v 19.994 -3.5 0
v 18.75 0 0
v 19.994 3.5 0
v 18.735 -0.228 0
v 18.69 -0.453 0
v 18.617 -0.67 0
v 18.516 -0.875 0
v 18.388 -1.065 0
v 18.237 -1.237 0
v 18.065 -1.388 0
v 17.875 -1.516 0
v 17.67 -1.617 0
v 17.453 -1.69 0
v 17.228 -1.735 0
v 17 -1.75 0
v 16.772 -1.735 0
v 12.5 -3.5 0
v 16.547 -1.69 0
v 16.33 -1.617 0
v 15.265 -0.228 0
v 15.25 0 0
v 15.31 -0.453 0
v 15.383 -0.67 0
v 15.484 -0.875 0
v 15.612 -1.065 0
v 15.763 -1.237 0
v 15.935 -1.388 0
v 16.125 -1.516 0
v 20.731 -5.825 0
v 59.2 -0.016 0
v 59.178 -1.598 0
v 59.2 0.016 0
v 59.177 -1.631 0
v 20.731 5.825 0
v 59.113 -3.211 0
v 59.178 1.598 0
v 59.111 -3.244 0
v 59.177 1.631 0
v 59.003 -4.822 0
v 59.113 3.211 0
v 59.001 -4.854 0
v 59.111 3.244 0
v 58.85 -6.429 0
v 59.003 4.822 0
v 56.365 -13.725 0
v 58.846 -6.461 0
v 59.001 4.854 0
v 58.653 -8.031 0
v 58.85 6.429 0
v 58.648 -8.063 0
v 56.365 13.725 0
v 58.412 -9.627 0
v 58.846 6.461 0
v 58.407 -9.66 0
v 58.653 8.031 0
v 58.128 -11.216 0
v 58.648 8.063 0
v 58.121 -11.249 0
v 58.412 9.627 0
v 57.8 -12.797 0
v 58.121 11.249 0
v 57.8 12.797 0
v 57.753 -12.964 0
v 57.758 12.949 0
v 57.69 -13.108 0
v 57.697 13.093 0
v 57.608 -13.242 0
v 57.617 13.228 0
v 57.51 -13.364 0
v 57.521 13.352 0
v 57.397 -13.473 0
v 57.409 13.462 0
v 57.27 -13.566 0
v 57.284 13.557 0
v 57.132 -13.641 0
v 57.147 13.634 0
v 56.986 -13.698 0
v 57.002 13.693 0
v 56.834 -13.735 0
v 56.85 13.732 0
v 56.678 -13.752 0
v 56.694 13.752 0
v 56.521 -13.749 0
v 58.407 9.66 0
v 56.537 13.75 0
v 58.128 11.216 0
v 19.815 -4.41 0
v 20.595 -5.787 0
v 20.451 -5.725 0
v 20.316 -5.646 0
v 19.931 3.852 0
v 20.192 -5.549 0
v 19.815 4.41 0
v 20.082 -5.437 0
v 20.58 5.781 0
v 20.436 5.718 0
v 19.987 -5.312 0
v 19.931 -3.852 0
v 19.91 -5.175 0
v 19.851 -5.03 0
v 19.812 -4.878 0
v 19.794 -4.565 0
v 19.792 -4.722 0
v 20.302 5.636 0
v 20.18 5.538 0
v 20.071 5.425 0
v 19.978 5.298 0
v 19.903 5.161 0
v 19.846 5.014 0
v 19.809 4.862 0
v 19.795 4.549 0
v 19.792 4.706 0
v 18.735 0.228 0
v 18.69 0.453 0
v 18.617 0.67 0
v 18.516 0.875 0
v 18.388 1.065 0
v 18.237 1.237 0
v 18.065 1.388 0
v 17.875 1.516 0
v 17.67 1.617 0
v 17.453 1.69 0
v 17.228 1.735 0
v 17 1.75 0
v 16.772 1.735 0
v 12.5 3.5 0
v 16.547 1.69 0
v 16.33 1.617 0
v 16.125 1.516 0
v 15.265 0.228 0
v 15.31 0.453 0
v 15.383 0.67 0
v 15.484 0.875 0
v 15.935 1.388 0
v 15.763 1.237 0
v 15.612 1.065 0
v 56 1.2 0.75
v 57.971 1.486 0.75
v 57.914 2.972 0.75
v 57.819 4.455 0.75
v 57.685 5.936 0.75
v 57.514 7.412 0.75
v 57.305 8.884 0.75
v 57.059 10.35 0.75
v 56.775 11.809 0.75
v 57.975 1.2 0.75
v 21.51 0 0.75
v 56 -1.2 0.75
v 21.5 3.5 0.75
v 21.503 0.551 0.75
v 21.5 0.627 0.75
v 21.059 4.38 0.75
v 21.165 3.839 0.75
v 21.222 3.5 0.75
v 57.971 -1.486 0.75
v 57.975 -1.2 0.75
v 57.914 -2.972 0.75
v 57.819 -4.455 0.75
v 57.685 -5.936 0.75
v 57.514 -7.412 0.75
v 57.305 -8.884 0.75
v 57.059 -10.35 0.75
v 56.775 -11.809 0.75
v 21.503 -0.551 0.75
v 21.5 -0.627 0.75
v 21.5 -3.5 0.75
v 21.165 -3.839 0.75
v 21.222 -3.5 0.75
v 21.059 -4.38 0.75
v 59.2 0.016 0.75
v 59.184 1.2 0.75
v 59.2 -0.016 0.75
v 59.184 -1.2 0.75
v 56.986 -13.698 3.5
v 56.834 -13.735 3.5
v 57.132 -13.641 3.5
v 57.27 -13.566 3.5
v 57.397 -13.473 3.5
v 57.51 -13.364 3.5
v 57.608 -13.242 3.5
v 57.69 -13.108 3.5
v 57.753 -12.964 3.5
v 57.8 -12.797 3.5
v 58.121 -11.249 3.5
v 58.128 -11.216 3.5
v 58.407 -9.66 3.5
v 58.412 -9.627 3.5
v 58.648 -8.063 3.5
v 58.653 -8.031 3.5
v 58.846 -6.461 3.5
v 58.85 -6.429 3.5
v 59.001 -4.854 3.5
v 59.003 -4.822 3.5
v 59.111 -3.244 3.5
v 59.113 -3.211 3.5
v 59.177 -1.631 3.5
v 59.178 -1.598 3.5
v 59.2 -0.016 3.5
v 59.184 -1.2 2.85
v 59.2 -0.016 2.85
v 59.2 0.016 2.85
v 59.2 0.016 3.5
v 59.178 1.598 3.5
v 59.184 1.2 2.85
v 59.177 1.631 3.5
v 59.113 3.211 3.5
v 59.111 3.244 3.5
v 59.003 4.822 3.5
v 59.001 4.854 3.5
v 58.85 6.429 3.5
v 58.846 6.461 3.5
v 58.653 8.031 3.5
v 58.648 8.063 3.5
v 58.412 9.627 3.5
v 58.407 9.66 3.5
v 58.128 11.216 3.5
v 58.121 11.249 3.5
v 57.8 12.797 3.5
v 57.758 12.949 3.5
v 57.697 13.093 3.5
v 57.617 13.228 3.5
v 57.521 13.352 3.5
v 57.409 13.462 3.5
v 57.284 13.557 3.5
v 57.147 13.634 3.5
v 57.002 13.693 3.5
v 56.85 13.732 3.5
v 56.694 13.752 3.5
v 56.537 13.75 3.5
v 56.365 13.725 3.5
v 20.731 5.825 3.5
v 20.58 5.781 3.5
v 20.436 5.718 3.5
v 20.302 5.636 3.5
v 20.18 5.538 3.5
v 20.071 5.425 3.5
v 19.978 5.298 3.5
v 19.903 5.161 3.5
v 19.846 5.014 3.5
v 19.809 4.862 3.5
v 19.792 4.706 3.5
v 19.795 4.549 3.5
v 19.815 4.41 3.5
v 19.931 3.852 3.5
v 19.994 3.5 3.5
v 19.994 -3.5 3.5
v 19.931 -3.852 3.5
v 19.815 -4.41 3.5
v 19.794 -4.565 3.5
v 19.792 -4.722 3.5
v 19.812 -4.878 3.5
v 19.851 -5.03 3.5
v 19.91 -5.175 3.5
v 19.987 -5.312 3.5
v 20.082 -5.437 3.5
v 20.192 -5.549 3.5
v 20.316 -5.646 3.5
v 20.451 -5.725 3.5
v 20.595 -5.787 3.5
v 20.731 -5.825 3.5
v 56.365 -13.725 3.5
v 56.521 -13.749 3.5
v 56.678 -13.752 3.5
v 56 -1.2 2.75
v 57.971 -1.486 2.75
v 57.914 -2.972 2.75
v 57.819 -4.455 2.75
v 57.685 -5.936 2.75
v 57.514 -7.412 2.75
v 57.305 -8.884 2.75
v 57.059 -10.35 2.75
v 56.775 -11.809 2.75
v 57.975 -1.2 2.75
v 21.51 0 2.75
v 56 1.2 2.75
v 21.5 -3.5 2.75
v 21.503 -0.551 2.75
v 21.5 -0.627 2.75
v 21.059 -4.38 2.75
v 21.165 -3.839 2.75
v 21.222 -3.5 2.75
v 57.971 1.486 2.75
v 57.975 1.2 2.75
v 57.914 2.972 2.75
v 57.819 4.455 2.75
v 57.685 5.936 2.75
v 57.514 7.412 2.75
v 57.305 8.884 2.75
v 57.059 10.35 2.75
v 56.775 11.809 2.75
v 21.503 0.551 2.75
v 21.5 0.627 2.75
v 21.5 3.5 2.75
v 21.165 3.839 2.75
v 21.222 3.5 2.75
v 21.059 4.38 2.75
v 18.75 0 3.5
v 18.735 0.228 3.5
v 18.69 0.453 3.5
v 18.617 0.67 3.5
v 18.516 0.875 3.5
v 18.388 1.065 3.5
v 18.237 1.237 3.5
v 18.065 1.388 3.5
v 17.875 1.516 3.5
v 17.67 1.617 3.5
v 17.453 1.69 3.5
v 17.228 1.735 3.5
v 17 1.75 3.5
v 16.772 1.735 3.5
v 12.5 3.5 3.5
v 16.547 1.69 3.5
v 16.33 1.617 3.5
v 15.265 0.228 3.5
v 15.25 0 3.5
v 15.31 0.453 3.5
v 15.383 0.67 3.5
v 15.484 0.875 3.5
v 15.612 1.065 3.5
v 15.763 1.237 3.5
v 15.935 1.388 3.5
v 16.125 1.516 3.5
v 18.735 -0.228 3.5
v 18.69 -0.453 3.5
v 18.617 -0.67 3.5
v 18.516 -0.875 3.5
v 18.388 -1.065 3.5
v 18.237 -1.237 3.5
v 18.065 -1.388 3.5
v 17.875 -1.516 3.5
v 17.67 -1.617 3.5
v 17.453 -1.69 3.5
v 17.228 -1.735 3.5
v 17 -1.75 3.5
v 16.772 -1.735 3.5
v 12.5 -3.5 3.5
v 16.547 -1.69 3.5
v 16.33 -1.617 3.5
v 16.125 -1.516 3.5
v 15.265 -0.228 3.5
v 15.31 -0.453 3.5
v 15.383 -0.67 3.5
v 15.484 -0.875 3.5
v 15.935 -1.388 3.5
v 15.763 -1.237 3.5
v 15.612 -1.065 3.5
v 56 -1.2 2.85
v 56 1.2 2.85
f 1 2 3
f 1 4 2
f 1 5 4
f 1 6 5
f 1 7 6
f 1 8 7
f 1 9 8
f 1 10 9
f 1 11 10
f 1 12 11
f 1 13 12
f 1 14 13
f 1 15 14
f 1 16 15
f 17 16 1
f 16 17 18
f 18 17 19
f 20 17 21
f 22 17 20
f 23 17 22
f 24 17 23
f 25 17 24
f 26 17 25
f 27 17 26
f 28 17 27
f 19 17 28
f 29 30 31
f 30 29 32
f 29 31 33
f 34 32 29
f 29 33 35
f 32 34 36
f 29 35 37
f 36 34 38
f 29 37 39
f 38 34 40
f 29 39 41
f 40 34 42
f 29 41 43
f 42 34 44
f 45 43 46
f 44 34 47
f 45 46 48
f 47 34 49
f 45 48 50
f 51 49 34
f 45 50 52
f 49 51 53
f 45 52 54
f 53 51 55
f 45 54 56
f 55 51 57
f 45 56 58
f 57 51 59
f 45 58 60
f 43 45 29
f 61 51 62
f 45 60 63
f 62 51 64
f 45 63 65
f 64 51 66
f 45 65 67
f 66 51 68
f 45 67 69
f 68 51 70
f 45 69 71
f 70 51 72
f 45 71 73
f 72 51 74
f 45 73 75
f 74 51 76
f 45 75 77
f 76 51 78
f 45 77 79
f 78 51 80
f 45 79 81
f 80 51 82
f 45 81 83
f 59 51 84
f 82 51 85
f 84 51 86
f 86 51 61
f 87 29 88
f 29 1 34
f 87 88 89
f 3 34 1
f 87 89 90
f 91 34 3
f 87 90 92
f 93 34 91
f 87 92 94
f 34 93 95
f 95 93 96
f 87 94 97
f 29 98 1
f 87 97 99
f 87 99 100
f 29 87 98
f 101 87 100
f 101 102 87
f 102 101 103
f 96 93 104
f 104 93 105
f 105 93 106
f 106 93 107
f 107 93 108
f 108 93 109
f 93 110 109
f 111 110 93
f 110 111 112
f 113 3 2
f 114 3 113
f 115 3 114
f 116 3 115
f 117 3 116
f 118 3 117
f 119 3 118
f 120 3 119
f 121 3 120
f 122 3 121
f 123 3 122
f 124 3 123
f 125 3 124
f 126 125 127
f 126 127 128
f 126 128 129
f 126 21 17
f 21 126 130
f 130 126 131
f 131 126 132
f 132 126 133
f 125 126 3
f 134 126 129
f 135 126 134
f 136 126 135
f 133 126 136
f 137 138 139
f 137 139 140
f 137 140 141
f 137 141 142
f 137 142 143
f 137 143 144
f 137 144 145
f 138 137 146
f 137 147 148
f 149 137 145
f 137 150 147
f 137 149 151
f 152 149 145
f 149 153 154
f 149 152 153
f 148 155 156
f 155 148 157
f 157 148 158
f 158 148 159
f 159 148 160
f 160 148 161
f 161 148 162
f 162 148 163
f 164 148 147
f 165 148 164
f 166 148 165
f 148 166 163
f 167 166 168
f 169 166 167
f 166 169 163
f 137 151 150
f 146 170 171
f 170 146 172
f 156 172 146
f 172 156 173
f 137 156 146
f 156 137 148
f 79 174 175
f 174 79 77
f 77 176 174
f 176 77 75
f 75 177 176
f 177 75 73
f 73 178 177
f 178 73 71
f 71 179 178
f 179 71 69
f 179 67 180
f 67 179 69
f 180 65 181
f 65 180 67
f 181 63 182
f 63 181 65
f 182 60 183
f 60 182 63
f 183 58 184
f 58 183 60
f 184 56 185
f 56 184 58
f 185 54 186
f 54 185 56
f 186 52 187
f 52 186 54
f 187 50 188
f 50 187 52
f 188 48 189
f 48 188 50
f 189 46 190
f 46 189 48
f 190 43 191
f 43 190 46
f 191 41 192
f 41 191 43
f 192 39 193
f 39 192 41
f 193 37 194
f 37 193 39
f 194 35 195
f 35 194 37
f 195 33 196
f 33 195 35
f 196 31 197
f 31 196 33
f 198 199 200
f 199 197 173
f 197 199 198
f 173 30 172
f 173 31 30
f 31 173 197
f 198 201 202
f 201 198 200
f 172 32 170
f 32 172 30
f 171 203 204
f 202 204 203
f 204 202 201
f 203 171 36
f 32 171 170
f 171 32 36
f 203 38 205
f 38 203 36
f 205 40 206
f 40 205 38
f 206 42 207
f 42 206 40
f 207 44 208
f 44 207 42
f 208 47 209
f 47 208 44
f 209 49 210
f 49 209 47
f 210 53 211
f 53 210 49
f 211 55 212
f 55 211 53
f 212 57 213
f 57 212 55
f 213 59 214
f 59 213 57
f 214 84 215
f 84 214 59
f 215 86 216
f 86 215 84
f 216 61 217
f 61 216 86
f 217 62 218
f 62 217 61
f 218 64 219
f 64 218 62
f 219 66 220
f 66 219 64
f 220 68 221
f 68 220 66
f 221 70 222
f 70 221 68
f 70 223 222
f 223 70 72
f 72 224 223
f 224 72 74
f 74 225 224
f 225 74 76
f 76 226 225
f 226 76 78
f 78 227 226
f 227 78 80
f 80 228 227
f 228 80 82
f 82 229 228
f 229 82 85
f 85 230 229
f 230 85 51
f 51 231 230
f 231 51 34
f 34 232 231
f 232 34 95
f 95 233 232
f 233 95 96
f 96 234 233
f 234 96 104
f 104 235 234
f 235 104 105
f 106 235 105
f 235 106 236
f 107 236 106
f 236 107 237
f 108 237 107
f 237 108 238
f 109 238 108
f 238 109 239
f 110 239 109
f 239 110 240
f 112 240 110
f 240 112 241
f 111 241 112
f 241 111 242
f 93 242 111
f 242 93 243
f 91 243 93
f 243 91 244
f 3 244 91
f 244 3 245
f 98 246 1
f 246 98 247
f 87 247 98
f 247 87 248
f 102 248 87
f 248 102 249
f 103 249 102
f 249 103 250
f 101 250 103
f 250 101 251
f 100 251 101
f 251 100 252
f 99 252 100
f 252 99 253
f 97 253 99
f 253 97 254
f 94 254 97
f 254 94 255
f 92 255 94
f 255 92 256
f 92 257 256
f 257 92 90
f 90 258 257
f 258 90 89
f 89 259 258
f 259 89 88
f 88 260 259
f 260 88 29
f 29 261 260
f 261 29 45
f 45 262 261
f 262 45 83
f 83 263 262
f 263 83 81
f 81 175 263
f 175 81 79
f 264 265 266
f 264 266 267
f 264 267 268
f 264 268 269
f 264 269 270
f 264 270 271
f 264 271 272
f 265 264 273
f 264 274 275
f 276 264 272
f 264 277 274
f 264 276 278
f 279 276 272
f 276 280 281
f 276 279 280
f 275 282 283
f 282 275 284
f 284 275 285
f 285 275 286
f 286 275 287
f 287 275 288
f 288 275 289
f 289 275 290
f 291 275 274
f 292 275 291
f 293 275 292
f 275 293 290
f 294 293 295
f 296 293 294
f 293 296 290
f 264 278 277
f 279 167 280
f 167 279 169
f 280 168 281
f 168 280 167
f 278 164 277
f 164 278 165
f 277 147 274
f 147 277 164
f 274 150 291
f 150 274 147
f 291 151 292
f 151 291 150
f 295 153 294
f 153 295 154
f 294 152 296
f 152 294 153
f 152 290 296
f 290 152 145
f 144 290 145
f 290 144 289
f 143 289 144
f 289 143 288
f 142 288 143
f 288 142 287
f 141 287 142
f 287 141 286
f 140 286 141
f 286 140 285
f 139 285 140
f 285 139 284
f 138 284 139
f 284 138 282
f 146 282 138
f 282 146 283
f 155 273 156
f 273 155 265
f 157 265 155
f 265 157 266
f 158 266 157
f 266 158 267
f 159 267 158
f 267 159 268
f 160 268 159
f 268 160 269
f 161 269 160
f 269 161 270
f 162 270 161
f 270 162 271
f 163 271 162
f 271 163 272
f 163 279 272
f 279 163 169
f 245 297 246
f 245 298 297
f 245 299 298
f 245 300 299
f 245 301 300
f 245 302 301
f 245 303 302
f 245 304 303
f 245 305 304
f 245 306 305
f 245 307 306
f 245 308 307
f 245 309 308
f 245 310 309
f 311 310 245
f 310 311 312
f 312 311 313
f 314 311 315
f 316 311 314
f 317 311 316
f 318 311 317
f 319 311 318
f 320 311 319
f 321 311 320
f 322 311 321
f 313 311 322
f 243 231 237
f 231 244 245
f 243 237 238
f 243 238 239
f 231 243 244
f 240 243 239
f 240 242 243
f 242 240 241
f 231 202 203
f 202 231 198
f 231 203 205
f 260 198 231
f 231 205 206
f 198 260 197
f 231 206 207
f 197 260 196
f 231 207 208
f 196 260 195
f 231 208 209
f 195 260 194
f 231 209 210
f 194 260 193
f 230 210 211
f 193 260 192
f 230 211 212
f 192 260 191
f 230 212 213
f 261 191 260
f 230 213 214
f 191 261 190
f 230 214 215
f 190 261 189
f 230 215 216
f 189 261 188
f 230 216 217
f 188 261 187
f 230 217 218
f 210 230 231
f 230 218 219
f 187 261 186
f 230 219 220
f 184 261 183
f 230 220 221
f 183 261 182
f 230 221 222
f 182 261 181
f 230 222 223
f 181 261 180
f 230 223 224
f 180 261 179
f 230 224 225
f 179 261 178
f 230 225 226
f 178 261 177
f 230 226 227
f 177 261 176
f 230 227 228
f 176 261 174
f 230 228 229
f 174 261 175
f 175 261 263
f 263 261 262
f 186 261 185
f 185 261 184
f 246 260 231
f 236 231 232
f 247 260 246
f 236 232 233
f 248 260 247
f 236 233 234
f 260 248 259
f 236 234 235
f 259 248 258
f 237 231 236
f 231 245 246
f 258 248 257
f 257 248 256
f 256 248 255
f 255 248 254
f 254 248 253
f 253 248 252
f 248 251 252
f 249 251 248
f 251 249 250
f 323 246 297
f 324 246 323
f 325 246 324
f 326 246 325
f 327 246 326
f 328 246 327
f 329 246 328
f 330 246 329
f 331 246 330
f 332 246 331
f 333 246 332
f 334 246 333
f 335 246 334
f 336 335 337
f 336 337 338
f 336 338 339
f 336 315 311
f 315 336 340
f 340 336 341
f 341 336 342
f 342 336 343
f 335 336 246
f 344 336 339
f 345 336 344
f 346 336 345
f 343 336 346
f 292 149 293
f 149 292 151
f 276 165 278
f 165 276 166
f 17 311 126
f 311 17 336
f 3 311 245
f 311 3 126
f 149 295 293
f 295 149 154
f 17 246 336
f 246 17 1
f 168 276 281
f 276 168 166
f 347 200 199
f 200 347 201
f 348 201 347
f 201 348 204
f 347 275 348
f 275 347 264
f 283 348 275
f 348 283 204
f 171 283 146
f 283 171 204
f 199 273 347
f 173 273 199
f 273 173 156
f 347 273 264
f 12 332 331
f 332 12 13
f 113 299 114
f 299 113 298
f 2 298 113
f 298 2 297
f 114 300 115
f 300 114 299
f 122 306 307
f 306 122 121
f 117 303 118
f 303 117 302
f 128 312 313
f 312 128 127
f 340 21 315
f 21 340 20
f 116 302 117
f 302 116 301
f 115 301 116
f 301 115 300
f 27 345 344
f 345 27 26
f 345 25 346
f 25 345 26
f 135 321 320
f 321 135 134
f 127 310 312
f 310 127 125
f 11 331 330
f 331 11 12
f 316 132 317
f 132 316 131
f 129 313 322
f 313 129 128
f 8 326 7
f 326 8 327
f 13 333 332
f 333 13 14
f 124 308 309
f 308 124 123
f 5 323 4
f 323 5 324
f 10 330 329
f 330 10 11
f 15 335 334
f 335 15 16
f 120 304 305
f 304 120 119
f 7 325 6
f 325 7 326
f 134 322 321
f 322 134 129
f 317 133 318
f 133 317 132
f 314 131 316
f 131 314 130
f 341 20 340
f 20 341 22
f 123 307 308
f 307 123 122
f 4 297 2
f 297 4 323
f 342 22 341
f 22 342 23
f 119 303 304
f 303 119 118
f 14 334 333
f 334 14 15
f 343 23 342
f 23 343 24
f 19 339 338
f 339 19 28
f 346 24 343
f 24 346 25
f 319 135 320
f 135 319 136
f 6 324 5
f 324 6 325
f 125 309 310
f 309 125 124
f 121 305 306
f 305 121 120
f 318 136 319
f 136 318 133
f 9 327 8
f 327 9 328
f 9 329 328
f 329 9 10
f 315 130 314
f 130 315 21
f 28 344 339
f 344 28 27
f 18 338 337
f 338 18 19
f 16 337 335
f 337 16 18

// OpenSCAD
// file: parameters.scad
// =============================================================================
// Gen-AA Vernier flux-claw dual nano-gap — WOUND-AWARE (HARD GATE)
// Improve Gen-X: tighter m2m ≤6.4, more copper (145 t), run_clear 0.70
// =============================================================================

wire_awg            = 26;
wire_od             = 0.45;
turns               = 145;      // +10 vs Gen-X 135
fill                = 0.70;
layers_per_face     = 2;
wind_build_axial    = layers_per_face * wire_od * fill;   // 0.63
wind_build_radial   = 3 * wire_od * fill;                 // 0.945

coil_id_r           = 21.5;
coil_od_r           = 58.0;
span_deg            = 25.0;     // 12 stations; vernier vs 16-pole equiv
former_web          = 2.0;
flange_t            = 0.75;
wall                = 1.2;
slot_w              = 2.4;
mount_hole          = 3.5;
tab_len             = 7.0;

former_bare_h       = former_web + 2 * flange_t;            // 3.5
coil_envelope_h     = former_bare_h + 2 * wind_build_axial; // 4.76

run_clear           = 0.70;
gap_spacer_h        = run_clear + wind_build_axial;         // 1.33
m2m                 = coil_envelope_h + 2 * run_clear;      // 6.16 (beats Gen-X 6.76; ≤6.4 target)

coil_stations       = 12;
bay_r_in            = coil_id_r - 2.0 - wind_build_radial;
bay_r_out           = coil_od_r + 2.0 + wind_build_radial;
bay_span            = span_deg + 4.0;
bay_offset          = 2.0;
stator_thick        = former_bare_h;
stator_od           = 156.0;
shaft_clear_stator  = 36.0;
coil_mount_r        = 28.0;

// Dual rotors: 8+8 Ø20 vernier poles + 24+24 Ø5 flux claws / edge assists
large_pocket_d      = 20.3;
small_pocket_d      = 5.3;
pocket_h            = 5.2;
large_n             = 8;
R_large             = 50.0;
R_small_inner       = 36.0;     // claw inner
R_small_mid         = 50.0;
R_small_outer       = 64.0;
carrier_od          = 152.0;
carrier_thick       = 7.5;
hub_h               = 10.0;
hub_od              = 30.0;
rotor_b_offset_deg  = 22.5;     // vernier offset

shaft_bore          = 8.35;
bearing_d           = 21.85;
bearing_h           = 7.2;
m3_clear            = 3.5;
bolt_r_inner        = 36.0;
bolt_n_inner        = 6;
flange_bolt_r       = 72.0;
flange_bolt_n       = 6;
brace_r             = 68.0;
brace_d             = 4.3;
brace_n             = 4;

spacer_pad_od       = 14.0;
spacer_pad_id       = m3_clear;
endbell_od          = 156.0;
endbell_thick       = 8.0;
endbell_shaft_clear = 10.0;

$fn = 64;
// main file
// Gen-AA pancake former — print ×12
// WOUND: wind_build_axial computed in parameters.scad; wind BEFORE assembly
include <parameters.scad>;
$fn = 48;

module sector_2d(r_in, r_out, ang) {
    polygon([
        for (a = [-ang/2 : ang/16 : ang/2]) [r_in*cos(a), r_in*sin(a)],
        for (a = [ang/2 : -ang/16 : -ang/2]) [r_out*cos(a), r_out*sin(a)]
    ]);
}
module flange() {
    linear_extrude(flange_t) offset(r=wall) sector_2d(coil_id_r, coil_od_r, span_deg);
}
difference() {
    union() {
        flange();
        translate([0, 0, flange_t])
            linear_extrude(former_web)
                difference() {
                    offset(r=wall) sector_2d(coil_id_r, coil_od_r, span_deg);
                    sector_2d(coil_id_r + 0.01, coil_od_r - 0.01, span_deg - 1.5);
                }
        translate([0, 0, flange_t + former_web]) flange();
        translate([coil_id_r - tab_len - 2, -3.5, 0])
            cube([tab_len + 2, 7, former_bare_h]);
    }
    translate([coil_od_r - 2, -slot_w/2, flange_t])
        cube([wall + 4, slot_w, former_web + 0.1]);
    translate([coil_id_r - tab_len/2 - 1, 0, -0.1])
        cylinder(d=mount_hole, h=former_bare_h + 1);
}
